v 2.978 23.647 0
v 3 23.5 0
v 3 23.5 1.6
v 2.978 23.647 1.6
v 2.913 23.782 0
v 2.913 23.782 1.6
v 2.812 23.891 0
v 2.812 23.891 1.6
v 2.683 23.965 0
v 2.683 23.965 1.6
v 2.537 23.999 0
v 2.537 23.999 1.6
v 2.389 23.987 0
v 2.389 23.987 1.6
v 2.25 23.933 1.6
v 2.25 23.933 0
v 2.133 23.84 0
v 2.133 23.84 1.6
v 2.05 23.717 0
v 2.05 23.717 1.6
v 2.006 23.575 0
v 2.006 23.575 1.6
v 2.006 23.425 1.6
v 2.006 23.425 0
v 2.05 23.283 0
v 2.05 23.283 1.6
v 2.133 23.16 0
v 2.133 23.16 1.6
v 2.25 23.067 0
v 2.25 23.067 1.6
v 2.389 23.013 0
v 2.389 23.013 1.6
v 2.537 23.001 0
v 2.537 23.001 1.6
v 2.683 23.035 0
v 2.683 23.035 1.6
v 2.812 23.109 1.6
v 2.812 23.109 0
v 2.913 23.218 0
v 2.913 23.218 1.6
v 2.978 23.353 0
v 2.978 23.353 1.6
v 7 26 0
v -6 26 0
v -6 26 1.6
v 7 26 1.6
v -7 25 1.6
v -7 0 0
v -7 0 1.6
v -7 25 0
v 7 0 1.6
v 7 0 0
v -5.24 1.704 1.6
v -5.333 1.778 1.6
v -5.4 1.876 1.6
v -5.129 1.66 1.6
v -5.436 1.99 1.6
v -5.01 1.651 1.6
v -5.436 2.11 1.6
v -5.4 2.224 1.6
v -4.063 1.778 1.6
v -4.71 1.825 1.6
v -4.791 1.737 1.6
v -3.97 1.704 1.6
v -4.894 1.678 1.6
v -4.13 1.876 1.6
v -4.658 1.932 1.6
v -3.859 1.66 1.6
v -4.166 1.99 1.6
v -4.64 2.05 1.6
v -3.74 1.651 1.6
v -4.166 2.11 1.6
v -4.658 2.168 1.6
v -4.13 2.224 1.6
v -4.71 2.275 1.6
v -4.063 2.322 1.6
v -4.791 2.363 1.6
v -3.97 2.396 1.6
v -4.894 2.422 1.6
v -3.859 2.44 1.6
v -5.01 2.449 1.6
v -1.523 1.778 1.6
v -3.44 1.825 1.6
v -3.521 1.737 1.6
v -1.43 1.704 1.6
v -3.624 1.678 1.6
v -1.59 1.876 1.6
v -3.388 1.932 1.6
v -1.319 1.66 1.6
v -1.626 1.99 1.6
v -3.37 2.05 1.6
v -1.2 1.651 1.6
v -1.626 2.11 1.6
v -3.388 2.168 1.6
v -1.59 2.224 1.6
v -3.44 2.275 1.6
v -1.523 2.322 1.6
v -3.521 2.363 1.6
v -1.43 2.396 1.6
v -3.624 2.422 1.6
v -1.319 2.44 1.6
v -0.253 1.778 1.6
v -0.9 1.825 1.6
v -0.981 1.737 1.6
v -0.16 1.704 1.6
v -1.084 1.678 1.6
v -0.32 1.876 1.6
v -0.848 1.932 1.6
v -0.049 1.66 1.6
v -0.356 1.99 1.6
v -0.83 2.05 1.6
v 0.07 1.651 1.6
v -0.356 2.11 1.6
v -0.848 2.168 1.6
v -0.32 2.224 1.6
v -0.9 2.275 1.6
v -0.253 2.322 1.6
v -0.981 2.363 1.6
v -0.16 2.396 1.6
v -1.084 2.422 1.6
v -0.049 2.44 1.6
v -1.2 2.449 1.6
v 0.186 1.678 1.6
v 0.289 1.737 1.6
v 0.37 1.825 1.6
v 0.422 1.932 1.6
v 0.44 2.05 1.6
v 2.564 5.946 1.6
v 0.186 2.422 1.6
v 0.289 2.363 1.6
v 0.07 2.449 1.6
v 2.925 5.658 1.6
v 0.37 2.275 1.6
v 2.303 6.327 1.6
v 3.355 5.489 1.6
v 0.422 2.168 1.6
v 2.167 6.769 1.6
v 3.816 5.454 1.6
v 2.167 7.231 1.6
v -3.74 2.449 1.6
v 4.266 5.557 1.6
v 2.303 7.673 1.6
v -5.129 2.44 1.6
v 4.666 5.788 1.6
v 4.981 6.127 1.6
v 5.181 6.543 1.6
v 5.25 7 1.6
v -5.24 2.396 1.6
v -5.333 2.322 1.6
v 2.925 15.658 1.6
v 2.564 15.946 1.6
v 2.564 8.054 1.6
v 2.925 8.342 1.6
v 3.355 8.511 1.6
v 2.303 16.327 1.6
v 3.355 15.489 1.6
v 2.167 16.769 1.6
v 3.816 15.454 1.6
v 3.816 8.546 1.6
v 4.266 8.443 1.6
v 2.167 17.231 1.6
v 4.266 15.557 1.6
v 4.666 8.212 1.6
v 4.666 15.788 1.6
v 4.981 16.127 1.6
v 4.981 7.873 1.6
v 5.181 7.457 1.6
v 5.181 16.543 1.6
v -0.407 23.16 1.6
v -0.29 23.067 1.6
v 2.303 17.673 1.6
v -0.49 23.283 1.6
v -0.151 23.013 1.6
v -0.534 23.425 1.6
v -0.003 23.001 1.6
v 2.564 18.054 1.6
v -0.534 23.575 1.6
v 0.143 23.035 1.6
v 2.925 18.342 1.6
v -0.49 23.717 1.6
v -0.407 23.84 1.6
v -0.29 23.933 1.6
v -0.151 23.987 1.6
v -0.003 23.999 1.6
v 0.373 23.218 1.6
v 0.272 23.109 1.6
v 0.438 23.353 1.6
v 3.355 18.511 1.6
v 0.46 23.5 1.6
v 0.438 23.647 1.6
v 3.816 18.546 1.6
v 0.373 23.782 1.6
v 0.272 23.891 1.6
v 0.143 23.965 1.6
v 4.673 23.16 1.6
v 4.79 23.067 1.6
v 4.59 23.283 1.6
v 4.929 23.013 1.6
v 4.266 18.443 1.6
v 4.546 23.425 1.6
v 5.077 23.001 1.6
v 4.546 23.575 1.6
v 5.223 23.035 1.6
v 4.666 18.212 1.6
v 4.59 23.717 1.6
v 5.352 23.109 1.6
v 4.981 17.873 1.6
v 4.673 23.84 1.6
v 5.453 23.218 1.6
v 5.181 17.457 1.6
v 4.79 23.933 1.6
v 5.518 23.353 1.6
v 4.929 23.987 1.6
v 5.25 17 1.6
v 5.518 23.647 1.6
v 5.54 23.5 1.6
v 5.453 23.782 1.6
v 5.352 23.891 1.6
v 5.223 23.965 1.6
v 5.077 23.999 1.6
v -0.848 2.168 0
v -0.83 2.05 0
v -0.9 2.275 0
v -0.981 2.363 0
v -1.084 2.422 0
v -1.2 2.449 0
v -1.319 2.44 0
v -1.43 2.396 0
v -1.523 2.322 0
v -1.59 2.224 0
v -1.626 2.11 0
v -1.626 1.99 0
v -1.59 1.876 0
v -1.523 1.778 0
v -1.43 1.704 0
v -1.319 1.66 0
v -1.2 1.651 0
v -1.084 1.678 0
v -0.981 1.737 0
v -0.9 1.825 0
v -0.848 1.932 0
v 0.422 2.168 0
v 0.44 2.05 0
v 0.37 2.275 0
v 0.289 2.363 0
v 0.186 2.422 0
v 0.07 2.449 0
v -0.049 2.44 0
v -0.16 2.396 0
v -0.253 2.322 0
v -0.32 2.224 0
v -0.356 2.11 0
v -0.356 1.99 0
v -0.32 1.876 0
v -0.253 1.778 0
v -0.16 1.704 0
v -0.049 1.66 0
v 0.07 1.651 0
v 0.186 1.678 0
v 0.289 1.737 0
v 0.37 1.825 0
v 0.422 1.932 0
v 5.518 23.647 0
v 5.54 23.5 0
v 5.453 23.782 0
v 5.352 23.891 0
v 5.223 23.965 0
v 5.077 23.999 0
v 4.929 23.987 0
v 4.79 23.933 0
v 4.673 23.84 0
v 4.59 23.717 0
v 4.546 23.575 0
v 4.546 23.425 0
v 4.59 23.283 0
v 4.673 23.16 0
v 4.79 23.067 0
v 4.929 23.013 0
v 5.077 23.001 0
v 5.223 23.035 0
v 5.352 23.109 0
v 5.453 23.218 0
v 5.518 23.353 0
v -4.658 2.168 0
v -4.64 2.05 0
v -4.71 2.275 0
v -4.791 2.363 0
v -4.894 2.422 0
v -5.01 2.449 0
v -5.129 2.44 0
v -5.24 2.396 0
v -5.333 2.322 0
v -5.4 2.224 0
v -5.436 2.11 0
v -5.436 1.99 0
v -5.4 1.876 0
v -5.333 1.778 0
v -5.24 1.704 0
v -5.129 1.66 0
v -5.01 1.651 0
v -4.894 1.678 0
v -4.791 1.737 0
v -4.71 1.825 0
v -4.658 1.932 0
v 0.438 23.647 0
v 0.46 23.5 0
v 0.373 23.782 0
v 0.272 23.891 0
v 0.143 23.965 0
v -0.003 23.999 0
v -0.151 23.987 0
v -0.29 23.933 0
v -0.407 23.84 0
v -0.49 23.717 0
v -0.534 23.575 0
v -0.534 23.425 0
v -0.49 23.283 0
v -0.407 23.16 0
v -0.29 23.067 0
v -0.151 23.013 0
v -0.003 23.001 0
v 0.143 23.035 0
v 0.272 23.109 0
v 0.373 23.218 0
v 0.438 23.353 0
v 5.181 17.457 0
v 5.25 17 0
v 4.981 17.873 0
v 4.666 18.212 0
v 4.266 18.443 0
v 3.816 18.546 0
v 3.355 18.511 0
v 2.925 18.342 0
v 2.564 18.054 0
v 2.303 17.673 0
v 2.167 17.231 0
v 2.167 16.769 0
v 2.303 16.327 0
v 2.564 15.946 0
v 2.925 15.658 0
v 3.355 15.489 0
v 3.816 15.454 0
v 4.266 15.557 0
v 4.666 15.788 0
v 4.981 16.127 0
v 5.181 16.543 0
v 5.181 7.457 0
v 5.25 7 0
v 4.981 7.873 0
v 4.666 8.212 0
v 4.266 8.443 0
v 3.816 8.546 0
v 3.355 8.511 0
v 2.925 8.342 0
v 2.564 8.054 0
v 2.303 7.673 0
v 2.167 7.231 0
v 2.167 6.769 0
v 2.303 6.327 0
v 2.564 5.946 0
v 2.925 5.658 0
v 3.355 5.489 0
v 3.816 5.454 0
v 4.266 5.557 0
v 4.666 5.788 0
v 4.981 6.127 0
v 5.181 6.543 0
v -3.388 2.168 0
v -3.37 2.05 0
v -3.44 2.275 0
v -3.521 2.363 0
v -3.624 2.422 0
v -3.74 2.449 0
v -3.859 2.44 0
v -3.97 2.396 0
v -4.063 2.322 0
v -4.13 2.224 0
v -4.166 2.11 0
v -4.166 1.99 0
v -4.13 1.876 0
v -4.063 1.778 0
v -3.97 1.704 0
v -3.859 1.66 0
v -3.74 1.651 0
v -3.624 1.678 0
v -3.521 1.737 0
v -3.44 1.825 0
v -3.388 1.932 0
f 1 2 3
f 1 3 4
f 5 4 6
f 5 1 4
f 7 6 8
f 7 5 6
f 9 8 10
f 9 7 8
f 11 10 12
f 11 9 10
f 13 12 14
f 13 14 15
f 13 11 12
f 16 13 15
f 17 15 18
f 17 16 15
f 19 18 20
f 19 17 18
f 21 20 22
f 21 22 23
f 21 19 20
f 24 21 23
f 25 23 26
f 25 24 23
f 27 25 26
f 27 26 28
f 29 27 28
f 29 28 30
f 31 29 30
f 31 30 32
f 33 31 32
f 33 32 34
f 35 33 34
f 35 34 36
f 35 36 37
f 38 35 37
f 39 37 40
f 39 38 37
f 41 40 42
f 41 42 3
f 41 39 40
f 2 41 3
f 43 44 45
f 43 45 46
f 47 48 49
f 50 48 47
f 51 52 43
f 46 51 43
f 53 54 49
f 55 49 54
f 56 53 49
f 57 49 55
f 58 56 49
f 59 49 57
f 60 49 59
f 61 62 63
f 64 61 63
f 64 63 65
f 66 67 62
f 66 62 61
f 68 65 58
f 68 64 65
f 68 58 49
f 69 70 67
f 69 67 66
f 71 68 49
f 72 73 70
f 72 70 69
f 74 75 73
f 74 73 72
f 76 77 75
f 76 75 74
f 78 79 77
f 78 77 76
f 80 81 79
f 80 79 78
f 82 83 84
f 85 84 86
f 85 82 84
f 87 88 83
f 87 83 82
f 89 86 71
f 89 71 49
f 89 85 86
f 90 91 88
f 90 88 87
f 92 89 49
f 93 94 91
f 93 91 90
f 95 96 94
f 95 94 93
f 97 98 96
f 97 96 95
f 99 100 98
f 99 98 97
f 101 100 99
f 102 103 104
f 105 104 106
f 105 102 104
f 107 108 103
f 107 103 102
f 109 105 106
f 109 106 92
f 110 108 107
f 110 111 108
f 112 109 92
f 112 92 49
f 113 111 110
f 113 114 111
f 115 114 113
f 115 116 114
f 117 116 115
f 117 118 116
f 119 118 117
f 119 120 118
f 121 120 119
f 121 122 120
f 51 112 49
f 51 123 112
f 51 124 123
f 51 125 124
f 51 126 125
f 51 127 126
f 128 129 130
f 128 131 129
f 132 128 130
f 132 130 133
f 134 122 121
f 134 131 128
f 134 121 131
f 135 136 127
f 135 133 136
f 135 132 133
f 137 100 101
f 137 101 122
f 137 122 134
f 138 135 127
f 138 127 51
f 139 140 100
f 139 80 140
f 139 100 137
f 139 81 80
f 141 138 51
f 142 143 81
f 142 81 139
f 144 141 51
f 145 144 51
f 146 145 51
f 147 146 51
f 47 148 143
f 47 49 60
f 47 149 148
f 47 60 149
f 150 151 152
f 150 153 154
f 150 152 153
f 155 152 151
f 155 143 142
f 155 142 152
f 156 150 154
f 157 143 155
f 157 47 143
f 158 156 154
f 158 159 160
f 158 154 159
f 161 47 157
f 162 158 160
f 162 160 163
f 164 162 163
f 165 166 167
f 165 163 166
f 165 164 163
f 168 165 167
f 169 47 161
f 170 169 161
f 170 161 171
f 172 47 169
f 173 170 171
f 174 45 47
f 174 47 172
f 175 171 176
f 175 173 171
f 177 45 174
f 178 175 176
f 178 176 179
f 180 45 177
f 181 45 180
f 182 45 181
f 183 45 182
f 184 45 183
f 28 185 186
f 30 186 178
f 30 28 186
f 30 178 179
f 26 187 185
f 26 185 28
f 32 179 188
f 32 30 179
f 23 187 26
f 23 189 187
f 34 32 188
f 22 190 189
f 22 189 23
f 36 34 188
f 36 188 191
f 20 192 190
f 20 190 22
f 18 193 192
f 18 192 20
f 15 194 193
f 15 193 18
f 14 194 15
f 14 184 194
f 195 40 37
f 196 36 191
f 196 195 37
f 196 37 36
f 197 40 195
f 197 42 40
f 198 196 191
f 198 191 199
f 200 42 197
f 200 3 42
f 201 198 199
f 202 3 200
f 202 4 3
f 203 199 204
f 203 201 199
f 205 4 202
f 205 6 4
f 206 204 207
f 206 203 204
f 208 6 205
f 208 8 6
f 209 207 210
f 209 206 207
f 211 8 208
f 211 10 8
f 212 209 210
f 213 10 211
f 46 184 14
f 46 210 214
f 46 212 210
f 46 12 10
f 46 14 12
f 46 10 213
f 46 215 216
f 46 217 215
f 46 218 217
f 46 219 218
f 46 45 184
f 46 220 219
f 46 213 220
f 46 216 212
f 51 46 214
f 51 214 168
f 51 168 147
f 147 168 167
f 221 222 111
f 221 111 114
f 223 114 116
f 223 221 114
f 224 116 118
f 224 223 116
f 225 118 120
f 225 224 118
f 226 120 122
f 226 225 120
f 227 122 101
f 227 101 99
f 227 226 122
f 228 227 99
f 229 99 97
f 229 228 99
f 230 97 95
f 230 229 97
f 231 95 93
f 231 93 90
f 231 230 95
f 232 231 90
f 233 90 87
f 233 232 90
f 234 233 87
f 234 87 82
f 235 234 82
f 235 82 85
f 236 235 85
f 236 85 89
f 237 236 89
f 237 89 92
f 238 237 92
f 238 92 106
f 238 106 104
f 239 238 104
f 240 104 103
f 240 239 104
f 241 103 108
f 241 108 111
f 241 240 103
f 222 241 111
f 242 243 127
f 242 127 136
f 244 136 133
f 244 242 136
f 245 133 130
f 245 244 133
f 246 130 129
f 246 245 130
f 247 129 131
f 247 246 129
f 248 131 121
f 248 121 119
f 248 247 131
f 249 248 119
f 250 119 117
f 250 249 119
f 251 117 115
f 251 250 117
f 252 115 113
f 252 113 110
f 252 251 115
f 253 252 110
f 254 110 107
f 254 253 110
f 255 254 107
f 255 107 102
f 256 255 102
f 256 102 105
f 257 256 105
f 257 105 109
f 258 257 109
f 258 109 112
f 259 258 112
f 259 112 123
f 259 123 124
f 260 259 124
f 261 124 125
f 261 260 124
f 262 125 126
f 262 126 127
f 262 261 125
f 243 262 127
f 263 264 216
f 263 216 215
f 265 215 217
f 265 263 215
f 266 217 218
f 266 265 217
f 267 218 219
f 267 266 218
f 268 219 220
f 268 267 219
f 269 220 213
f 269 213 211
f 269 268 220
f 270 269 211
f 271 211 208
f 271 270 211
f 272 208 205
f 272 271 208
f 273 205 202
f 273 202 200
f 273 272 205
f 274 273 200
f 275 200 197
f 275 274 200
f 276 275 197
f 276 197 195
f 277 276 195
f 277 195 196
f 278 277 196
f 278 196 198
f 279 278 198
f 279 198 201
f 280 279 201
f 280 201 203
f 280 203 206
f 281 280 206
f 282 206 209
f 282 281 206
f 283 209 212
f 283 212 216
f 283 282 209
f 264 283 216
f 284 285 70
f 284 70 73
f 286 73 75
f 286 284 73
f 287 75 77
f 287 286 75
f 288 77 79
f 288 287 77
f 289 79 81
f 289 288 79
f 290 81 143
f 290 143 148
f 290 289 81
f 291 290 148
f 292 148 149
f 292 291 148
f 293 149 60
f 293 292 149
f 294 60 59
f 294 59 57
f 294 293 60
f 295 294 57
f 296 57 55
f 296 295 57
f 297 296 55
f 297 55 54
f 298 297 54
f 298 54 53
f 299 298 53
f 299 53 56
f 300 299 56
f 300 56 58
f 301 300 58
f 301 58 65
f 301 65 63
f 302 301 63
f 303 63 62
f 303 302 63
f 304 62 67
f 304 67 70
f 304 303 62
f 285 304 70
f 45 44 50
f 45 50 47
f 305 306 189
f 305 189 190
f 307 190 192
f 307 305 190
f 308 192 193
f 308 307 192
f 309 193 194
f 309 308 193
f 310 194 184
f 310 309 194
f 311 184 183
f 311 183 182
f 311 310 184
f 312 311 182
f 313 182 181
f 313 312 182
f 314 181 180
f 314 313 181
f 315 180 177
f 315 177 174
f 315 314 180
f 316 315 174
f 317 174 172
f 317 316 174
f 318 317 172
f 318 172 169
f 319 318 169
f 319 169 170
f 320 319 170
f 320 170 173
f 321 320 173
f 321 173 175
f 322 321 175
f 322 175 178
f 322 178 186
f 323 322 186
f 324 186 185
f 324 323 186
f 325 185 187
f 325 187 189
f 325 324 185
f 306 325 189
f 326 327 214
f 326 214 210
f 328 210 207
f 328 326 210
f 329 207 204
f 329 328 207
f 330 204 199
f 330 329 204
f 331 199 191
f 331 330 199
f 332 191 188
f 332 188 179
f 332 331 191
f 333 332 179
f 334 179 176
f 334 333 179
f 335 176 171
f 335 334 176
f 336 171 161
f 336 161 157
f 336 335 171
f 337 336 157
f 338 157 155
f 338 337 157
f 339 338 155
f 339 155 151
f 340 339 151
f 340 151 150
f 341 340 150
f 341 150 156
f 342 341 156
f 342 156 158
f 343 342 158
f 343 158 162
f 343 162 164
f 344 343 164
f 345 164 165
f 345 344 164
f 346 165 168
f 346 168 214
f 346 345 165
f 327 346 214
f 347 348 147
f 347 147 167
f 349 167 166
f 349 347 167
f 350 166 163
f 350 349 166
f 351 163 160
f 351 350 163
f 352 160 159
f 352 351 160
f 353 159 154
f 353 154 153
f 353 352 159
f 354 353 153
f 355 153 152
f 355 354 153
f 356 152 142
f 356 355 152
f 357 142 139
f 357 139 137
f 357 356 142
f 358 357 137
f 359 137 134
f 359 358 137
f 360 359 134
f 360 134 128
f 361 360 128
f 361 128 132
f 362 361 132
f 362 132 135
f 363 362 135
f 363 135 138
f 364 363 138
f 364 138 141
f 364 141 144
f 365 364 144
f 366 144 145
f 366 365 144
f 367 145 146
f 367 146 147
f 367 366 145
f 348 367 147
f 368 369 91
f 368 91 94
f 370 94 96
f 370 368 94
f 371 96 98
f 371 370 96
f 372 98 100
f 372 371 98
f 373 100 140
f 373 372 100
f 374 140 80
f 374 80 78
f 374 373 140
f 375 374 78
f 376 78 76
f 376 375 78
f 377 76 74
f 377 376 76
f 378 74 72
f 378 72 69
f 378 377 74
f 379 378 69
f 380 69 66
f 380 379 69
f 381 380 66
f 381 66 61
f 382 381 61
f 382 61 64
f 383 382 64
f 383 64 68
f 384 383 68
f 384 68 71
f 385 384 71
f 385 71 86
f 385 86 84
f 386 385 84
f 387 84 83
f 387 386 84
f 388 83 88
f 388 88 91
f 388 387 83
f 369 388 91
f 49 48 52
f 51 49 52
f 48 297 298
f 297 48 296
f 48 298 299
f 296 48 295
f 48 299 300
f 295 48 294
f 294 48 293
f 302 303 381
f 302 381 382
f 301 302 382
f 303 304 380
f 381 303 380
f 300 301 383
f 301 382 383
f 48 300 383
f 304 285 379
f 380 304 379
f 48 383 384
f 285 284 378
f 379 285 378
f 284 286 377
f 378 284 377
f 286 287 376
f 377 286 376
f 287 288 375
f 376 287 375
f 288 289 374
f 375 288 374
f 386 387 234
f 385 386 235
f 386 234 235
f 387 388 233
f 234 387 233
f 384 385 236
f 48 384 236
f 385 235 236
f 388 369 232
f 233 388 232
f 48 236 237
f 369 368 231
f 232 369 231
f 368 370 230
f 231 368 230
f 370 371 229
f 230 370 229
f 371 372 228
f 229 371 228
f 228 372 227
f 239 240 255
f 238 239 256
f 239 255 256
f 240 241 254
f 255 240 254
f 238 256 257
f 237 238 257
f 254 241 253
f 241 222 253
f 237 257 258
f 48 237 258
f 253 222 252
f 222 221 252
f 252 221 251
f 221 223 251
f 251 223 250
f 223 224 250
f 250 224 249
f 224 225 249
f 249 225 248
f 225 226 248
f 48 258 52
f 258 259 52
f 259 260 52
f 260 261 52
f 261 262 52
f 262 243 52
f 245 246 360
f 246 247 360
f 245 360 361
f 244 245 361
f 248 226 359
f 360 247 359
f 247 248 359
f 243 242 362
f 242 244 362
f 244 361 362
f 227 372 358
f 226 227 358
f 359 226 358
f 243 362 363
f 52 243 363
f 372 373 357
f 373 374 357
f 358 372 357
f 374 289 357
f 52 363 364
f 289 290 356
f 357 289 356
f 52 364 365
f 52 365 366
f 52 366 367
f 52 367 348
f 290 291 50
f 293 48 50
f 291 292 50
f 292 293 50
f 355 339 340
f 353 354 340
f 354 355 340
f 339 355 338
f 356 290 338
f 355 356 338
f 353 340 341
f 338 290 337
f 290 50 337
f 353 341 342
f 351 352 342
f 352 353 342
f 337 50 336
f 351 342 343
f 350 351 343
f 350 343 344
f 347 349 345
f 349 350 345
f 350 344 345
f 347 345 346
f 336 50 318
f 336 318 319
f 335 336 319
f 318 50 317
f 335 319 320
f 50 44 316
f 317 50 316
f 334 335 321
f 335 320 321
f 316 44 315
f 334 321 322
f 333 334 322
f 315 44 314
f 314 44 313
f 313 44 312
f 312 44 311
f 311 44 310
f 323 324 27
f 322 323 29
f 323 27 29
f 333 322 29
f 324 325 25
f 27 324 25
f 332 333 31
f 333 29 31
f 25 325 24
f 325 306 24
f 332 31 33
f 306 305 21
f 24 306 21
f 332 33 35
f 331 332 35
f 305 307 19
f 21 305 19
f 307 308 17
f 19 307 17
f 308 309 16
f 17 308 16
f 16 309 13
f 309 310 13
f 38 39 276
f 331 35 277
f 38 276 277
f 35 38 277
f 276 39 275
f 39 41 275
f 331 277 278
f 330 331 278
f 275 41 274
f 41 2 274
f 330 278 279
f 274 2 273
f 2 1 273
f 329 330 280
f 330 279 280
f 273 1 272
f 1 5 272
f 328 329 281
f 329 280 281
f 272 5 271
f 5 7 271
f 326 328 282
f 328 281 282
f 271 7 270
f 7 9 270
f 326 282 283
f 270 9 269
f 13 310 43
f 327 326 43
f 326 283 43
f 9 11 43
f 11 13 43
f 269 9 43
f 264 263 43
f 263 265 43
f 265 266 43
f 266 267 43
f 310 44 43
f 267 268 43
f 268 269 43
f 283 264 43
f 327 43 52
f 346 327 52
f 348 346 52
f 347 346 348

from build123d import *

# Parameters (mm, degrees)
SKETCH1_W           = 14
SKETCH1_H           = 26
SKETCH1_R           = 0.5
SKETCH1_R_2         = 0.4
SKETCH1_R_3         = 1.55
BOSS_EXTRUDE1_DEPTH = 1.6
CHAMFER1_SIZE       = 1


with BuildPart() as part:
    # Sketch1 → Boss-Extrude1 (new body)
    with BuildSketch(Plane.XY):
        with Locations((0, 13)):
            Rectangle(SKETCH1_W, SKETCH1_H)
        with Locations((-0.04, 23.5)):
            Circle(SKETCH1_R, mode=Mode.SUBTRACT)
        with Locations((2.5, 23.5)):
            Circle(SKETCH1_R, mode=Mode.SUBTRACT)
        with Locations((5.04, 23.5)):
            Circle(SKETCH1_R, mode=Mode.SUBTRACT)
        with Locations((-5.04, 2.05)):
            Circle(SKETCH1_R_2, mode=Mode.SUBTRACT)
        with Locations((-3.77, 2.05)):
            Circle(SKETCH1_R_2, mode=Mode.SUBTRACT)
        with Locations((-1.23, 2.05)):
            Circle(SKETCH1_R_2, mode=Mode.SUBTRACT)
        with Locations((0.04, 2.05)):
            Circle(SKETCH1_R_2, mode=Mode.SUBTRACT)
        with Locations((3.7, 7)):
            Circle(SKETCH1_R_3, mode=Mode.SUBTRACT)
        with Locations((3.7, 17)):
            Circle(SKETCH1_R_3, mode=Mode.SUBTRACT)
    extrude(amount=BOSS_EXTRUDE1_DEPTH)

    # Chamfer1
    chamfer1_edges = [part.edges().sort_by_distance(p)[0] for p in [
        (-7, 26, 0.8),
    ]]
    chamfer(chamfer1_edges, length=CHAMFER1_SIZE)


solid = part.part
